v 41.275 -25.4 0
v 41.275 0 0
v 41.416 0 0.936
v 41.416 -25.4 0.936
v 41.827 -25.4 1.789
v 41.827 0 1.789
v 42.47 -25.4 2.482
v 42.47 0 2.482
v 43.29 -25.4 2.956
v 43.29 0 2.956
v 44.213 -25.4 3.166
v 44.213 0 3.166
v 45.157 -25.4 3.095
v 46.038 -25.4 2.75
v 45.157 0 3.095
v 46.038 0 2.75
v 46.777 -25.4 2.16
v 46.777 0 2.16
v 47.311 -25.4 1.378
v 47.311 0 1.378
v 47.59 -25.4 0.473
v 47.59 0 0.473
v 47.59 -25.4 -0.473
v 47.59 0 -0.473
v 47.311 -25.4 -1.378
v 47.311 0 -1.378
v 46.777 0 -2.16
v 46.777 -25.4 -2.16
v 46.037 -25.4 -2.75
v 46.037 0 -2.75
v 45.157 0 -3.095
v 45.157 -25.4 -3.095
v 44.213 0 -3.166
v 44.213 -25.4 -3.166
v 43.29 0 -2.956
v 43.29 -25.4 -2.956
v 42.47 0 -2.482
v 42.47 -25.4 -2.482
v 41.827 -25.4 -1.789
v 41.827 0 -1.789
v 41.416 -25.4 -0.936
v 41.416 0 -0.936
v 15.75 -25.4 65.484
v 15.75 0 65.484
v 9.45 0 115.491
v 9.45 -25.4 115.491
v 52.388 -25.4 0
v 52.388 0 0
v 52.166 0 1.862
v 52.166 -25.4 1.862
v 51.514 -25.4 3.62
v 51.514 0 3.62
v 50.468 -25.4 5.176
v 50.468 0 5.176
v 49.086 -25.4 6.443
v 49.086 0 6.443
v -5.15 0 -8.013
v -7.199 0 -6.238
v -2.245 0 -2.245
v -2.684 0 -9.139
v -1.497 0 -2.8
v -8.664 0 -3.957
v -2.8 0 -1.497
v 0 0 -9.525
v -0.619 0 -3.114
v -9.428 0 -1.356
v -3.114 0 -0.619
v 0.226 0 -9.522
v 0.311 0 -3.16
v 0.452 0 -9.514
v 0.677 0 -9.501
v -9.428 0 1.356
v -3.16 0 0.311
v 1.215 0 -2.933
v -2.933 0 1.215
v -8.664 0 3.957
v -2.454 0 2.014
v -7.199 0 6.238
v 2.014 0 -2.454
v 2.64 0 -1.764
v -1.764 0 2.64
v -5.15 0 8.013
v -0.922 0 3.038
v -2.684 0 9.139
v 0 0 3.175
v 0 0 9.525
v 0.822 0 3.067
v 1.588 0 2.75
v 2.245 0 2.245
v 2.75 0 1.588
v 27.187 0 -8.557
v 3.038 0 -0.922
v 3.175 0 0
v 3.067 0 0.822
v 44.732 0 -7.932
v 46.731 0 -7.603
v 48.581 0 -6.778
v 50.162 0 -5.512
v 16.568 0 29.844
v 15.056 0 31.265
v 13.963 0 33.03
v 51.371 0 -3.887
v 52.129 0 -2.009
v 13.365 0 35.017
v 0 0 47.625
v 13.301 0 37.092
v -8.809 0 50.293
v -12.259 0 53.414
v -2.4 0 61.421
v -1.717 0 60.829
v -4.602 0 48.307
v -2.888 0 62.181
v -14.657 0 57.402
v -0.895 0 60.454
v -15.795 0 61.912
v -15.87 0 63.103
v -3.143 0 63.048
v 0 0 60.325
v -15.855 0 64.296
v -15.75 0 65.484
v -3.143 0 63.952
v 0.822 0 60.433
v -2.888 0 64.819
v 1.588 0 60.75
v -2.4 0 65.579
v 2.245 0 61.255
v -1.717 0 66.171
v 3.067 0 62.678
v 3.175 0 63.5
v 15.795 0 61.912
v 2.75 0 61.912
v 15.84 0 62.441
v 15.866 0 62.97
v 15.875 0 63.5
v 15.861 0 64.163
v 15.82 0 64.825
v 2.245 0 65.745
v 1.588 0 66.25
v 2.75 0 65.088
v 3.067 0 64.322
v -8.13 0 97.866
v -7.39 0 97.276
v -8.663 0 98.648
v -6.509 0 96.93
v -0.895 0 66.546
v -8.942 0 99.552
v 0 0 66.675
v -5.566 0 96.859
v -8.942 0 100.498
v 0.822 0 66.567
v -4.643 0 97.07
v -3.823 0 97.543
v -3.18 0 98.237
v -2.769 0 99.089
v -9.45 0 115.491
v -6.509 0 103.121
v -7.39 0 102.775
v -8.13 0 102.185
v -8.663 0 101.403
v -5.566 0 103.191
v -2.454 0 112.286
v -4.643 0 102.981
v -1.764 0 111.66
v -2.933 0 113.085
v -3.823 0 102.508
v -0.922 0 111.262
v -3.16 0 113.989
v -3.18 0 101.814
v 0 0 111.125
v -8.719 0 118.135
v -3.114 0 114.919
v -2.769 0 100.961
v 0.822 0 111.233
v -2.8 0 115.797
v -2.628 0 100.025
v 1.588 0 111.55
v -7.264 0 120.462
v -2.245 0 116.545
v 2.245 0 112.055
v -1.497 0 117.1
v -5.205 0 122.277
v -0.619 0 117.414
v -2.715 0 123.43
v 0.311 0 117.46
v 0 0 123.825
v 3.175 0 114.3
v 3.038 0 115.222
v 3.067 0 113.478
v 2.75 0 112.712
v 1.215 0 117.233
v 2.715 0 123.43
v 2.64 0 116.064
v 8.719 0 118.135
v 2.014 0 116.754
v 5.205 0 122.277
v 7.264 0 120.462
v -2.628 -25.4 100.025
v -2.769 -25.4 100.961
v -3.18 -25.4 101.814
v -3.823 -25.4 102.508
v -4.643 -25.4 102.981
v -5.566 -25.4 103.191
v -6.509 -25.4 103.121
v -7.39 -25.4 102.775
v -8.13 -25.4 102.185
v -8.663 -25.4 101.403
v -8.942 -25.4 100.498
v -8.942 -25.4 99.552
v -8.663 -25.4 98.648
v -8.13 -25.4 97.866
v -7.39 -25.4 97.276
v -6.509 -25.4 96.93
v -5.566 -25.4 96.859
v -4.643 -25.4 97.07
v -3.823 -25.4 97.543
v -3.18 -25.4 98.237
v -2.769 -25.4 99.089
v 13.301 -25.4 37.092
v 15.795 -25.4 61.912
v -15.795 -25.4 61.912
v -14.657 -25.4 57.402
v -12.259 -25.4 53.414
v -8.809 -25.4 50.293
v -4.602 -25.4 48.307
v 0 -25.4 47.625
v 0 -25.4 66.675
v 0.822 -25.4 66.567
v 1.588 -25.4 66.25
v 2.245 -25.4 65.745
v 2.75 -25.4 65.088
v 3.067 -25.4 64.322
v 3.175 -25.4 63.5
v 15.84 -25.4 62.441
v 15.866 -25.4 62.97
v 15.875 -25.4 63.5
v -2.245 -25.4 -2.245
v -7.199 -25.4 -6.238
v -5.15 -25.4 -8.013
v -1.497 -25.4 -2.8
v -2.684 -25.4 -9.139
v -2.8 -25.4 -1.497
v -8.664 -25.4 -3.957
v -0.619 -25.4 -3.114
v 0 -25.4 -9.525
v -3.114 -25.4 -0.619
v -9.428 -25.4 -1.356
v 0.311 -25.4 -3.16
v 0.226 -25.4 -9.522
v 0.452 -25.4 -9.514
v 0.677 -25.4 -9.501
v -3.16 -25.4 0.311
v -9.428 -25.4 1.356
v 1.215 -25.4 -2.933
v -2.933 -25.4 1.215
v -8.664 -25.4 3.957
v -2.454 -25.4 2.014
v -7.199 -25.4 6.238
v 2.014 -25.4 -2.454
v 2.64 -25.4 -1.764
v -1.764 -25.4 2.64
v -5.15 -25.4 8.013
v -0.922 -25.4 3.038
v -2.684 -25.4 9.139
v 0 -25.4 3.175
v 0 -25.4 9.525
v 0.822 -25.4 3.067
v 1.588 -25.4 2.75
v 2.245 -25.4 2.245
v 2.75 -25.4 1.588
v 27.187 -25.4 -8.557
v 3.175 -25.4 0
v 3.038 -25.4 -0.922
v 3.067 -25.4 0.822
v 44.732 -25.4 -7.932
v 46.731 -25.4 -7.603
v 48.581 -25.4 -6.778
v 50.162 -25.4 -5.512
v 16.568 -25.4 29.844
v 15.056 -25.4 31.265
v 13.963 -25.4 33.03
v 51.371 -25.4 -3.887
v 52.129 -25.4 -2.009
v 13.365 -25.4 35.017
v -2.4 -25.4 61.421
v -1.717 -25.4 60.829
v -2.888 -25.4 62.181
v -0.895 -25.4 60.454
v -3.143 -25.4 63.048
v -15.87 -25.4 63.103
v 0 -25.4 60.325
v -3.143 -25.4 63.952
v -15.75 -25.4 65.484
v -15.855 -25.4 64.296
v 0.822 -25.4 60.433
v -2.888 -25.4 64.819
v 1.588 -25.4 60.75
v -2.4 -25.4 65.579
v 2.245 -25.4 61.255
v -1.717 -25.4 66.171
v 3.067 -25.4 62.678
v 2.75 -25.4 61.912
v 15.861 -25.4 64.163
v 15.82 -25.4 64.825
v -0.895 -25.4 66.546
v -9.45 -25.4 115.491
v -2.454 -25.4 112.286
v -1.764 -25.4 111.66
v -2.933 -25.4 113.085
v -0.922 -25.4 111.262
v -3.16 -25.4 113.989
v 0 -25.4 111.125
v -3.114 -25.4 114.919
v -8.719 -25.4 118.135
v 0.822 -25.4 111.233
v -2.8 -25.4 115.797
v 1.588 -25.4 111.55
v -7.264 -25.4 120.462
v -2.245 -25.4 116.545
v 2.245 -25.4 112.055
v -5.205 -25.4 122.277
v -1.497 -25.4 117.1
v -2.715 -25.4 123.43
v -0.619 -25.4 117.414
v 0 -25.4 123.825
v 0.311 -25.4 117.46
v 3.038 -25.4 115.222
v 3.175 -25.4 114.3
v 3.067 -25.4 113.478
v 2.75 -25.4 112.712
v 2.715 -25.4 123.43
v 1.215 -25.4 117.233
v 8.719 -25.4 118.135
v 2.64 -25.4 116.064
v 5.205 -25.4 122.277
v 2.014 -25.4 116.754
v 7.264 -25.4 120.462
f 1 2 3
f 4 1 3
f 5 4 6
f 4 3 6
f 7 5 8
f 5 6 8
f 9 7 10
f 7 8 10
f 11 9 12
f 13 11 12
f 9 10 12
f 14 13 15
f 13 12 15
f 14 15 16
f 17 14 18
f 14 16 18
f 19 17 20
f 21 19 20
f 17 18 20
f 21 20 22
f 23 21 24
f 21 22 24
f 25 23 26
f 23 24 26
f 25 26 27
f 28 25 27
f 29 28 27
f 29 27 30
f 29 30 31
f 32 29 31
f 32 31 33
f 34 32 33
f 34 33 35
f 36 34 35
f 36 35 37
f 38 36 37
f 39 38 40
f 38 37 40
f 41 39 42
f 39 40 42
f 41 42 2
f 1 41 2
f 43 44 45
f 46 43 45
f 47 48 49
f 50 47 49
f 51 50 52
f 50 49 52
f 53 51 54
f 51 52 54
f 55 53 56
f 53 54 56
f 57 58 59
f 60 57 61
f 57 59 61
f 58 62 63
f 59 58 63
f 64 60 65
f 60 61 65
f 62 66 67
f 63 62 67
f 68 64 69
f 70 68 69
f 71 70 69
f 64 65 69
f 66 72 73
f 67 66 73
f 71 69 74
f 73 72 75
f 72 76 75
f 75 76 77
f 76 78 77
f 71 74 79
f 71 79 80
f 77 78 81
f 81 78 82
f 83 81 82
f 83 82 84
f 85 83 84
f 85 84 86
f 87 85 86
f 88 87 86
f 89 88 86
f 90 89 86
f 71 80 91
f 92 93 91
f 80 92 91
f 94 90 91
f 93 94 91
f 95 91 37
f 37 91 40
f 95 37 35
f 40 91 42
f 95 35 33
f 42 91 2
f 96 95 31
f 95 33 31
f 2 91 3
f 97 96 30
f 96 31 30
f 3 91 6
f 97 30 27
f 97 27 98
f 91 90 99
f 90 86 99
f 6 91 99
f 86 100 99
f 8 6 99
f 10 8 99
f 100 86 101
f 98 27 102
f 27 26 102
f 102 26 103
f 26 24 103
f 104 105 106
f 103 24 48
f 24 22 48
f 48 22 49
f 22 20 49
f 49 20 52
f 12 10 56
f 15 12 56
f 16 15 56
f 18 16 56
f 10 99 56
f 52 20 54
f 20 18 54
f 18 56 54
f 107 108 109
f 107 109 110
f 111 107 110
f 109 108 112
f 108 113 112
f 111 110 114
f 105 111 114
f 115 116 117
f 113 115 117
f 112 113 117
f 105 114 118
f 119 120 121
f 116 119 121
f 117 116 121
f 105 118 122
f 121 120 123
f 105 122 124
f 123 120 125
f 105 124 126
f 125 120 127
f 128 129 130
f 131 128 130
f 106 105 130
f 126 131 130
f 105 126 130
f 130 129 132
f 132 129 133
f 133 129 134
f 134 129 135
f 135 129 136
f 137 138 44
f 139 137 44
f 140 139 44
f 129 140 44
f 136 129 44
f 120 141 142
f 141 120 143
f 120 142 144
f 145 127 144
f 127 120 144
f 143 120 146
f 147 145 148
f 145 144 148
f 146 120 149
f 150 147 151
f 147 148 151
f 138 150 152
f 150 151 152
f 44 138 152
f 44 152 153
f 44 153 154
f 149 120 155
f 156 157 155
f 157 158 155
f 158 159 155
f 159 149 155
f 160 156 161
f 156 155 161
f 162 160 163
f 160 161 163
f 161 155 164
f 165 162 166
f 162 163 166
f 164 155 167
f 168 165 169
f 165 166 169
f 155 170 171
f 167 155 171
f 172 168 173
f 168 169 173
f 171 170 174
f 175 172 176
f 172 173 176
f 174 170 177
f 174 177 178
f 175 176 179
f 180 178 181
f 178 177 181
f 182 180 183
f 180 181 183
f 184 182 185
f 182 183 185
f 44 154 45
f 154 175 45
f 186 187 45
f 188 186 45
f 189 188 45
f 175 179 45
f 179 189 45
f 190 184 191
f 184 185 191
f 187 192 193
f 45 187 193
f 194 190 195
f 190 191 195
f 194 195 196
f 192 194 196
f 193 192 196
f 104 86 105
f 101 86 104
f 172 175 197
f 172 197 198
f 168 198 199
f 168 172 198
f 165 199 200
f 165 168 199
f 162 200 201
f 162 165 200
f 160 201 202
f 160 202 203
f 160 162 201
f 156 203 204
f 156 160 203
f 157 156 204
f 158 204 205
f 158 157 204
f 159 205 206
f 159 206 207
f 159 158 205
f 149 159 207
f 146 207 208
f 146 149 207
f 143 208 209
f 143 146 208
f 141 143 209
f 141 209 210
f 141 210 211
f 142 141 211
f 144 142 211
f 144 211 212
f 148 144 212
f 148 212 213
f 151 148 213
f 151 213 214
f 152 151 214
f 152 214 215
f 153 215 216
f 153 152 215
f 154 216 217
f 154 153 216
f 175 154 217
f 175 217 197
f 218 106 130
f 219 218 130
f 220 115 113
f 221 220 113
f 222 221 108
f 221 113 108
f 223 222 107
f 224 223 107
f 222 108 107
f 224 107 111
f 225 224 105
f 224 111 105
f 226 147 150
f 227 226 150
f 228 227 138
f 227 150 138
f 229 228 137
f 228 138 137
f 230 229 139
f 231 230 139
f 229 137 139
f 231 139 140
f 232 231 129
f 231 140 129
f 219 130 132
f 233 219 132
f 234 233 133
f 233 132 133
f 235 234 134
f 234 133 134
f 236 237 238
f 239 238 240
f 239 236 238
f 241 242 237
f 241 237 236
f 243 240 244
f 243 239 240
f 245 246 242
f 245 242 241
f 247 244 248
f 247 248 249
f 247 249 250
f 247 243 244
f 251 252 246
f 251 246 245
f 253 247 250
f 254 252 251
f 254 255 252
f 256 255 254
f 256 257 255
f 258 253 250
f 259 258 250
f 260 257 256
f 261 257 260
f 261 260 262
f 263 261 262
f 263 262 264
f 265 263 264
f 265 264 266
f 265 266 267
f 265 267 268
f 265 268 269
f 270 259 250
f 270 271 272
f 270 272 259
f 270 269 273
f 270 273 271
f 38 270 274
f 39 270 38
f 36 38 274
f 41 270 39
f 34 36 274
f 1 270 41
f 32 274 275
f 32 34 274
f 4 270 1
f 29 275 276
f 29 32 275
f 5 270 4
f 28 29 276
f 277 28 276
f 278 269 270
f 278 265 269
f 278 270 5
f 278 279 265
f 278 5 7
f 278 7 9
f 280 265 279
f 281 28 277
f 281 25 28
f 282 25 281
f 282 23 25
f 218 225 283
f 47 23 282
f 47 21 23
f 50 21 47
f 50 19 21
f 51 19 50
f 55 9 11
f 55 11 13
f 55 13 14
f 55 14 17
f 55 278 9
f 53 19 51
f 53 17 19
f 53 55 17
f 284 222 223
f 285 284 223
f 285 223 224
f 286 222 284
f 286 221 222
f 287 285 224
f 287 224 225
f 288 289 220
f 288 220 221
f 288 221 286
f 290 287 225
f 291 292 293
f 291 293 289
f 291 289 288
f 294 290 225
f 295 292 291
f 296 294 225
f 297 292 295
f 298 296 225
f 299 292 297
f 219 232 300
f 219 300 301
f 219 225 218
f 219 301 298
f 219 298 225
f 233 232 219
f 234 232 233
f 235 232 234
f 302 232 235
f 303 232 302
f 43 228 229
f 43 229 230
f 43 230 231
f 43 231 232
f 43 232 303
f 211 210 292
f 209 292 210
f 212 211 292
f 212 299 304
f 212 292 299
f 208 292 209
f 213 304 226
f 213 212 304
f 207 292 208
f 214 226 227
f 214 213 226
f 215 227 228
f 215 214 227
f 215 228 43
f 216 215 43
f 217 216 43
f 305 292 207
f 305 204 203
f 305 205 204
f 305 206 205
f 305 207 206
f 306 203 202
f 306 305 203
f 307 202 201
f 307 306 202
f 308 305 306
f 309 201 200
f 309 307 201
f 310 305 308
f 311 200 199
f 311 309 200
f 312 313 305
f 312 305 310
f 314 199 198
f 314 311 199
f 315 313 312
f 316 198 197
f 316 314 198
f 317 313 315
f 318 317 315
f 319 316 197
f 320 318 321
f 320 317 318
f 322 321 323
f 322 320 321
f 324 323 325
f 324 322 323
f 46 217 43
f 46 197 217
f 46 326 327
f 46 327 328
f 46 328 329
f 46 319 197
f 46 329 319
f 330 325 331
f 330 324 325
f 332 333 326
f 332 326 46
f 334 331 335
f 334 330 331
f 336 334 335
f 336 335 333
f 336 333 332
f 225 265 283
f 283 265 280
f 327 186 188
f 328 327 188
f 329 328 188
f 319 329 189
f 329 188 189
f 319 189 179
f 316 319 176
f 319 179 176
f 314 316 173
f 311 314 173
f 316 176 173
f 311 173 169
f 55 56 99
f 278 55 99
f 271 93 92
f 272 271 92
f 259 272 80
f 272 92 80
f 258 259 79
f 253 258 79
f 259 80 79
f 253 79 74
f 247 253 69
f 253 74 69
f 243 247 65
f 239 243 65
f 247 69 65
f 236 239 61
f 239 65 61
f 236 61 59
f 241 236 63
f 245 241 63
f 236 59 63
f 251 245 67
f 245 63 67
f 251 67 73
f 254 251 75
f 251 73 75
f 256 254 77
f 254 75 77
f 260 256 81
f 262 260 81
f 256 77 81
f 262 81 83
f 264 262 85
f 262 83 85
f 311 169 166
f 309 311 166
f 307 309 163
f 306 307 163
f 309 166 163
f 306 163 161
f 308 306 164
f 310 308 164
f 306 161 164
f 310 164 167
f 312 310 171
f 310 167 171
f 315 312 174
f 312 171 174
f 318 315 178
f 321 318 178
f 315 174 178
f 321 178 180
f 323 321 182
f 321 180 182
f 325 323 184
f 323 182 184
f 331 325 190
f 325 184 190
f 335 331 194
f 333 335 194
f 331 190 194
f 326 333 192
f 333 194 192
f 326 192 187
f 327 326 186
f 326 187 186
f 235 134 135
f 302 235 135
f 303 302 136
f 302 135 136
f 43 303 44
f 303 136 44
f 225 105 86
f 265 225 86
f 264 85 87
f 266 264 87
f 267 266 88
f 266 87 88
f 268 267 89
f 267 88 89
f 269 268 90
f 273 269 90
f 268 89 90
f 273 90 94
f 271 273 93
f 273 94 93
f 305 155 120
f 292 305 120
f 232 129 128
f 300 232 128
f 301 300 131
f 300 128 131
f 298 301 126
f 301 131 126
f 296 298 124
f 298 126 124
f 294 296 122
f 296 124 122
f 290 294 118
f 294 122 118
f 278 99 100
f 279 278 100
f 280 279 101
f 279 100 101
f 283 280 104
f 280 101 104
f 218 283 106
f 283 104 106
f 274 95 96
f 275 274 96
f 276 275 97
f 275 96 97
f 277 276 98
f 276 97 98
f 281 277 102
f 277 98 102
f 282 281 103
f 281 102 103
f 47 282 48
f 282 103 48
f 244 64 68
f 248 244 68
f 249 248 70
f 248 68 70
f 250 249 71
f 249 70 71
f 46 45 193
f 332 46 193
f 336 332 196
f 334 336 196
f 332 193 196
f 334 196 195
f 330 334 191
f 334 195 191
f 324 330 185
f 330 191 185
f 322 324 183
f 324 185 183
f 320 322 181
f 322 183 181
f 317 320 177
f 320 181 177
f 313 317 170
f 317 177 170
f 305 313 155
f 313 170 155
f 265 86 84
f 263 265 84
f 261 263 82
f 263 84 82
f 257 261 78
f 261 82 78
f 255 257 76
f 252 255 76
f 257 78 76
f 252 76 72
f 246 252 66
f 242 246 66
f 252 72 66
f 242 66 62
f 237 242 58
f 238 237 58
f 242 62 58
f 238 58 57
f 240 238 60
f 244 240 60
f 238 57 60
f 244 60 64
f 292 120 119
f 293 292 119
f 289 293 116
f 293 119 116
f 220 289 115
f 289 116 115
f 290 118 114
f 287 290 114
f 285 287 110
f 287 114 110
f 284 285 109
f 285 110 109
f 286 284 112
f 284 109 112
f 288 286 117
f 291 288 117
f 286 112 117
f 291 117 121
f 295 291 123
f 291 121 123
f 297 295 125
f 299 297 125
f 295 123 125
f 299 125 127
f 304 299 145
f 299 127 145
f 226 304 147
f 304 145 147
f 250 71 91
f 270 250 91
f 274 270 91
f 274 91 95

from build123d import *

# Parameters (mm, degrees)
F0_R     = 3.175
F1_DEPTH = 25.4


with BuildPart() as f1:
    # F0 (on Front) → F1 (new body)
    with BuildSketch(Plane.XZ):
        with BuildLine():
            ThreePointArc((3.175, 0), (-2.2450640303, -2.2450640303), (0, 3.175))
            Line((0, 3.175), (0, 9.525))
            ThreePointArc((0, 9.525), (-9.525, 0), (0, -9.525))
            Line((0, -9.525), (0.6773435479, -9.500885786))
            ThreePointArc((0.6773435479, -9.500885786), (6.9705567315, -6.4912990883), (9.525, 0))
            Line((9.525, 0), (3.175, 0))
        make_face()
        with BuildLine():
            Line((0, 9.525), (0, 3.175))
            ThreePointArc((0, 3.175), (2.2450640303, 2.2450640303), (3.175, 0))
            Line((3.175, 0), (9.525, 0))
            ThreePointArc((9.525, 0), (6.7351920908, 6.7351920908), (0, 9.525))
        make_face()
        with BuildLine():
            Line((0, 47.625), (0, 9.525))
            ThreePointArc((0, 9.525), (6.7351920908, 6.7351920908), (9.525, 0))
            Line((9.525, 0), (36.5125, 0))
            ThreePointArc((36.5125, 0), (40.830361875, 7.0641436915), (49.0862640553, 6.442744901))
            Line((49.0862640553, 6.442744901), (16.5675029115, 29.8435726117))
            ThreePointArc((16.5675029115, 29.8435726117), (13.9631116964, 33.0299588598), (13.3008358668, 37.0916459046))
            Line((13.3008358668, 37.0916459046), (15.7954255641, 61.9125))
            ThreePointArc((15.7954255641, 61.9125), (10.6492737428, 51.7267849017), (0, 47.625))
        make_face()
        with BuildLine():
            Line((36.5125, 0), (9.525, 0))
            ThreePointArc((9.525, 0), (6.9705567315, -6.4912990883), (0.6773435479, -9.500885786))
            Line((0.6773435479, -9.500885786), (27.1872243516, -8.5571033561))
            Line((27.1872243516, -8.5571033561), (44.7324052746, -7.9324746146))
            ThreePointArc((44.7324052746, -7.9324746146), (38.9380895153, -5.7116327839), (36.5125, 0))
        make_face()
        with BuildLine():
            ThreePointArc((-15.7954255641, 61.9125), (-10.6492737428, 51.7267849017), (0, 47.625))
            Line((0, 47.625), (0, 60.325))
            ThreePointArc((0, 60.325), (-3.175, 63.5), (0, 66.675))
            Line((0, 66.675), (0, 79.375))
            ThreePointArc((0, 79.375), (-10.5003255158, 75.40625), (-15.7504882737, 65.484375))
            ThreePointArc((-15.7504882737, 65.484375), (-15.8737438155, 63.6997054867), (-15.7954255641, 61.9125))
        make_face()
        with BuildLine():
            Line((0, 60.325), (0, 47.625))
            ThreePointArc((0, 47.625), (10.6492737428, 51.7267849017), (15.7954255641, 61.9125))
            ThreePointArc((15.7954255641, 61.9125), (15.8550939106, 62.7052534459), (15.875, 63.5))
            ThreePointArc((15.875, 63.5), (15.8438414904, 64.4941387366), (15.7504882737, 65.484375))
            ThreePointArc((15.7504882737, 65.484375), (10.5003255158, 75.40625), (0, 79.375))
            Line((0, 79.375), (0, 66.675))
            ThreePointArc((0, 66.675), (2.2450640303, 65.7450640303), (3.175, 63.5))
            ThreePointArc((3.175, 63.5), (2.2450640303, 61.2549359697), (0, 60.325))
        make_face()
        with BuildLine():
            Line((0.6773435479, -9.500885786), (0, -9.525))
            ThreePointArc((0, -9.525), (0.3388863295, -9.5189695375), (0.6773435479, -9.500885786))
        make_face()
        with BuildLine():
            ThreePointArc((49.0862640553, 6.442744901), (40.830361875, 7.0641436915), (36.5125, 0))
            ThreePointArc((36.5125, 0), (38.9380895153, -5.7116327839), (44.7324052746, -7.9324746146))
            ThreePointArc((44.7324052746, -7.9324746146), (50.1616327839, -5.5119104847), (52.3875, 0))
            ThreePointArc((52.3875, 0), (51.5141436915, 3.619638125), (49.0862640553, 6.442744901))
        make_face()
        with BuildLine():
            ThreePointArc((47.625, 0), (44.45, -3.175), (41.275, 0))
            ThreePointArc((41.275, 0), (44.45, 3.175), (47.625, 0))
        make_face(mode=Mode.SUBTRACT)
        with BuildLine():
            Line((-9.4502929642, 115.490625), (-15.7504882737, 65.484375))
            ThreePointArc((-15.7504882737, 65.484375), (-10.5003255158, 75.40625), (0, 79.375))
            Line((0, 79.375), (0, 104.775))
            ThreePointArc((0, 104.775), (-7.14375, 107.9998046905), (-9.4502929642, 115.490625))
        make_face()
        with Locations((-5.8028255589, 100.0252)):
            Circle(F0_R, mode=Mode.SUBTRACT)
        with BuildLine():
            Line((0, 104.775), (0, 79.375))
            ThreePointArc((0, 79.375), (10.5003255158, 75.40625), (15.7504882737, 65.484375))
            Line((15.7504882737, 65.484375), (9.4502929642, 115.490625))
            ThreePointArc((9.4502929642, 115.490625), (9.5063048942, 114.896483242), (9.525, 114.3))
            ThreePointArc((9.525, 114.3), (6.7351920908, 107.5648079092), (0, 104.775))
        make_face()
        with BuildLine():
            ThreePointArc((9.4502929642, 115.490625), (0, 123.825), (-9.4502929642, 115.490625))
            ThreePointArc((-9.4502929642, 115.490625), (-7.14375, 107.9998046905), (0, 104.775))
            ThreePointArc((0, 104.775), (6.7351920908, 107.5648079092), (9.525, 114.3))
            ThreePointArc((9.525, 114.3), (9.5063048942, 114.896483242), (9.4502929642, 115.490625))
        make_face()
        with BuildLine():
            ThreePointArc((3.175, 114.3), (2.2450640303, 112.0549359697), (0, 111.125))
            ThreePointArc((0, 111.125), (-2.2450640303, 116.5450640303), (3.175, 114.3))
        make_face(mode=Mode.SUBTRACT)
    extrude(amount=F1_DEPTH)


solid = f1.part
